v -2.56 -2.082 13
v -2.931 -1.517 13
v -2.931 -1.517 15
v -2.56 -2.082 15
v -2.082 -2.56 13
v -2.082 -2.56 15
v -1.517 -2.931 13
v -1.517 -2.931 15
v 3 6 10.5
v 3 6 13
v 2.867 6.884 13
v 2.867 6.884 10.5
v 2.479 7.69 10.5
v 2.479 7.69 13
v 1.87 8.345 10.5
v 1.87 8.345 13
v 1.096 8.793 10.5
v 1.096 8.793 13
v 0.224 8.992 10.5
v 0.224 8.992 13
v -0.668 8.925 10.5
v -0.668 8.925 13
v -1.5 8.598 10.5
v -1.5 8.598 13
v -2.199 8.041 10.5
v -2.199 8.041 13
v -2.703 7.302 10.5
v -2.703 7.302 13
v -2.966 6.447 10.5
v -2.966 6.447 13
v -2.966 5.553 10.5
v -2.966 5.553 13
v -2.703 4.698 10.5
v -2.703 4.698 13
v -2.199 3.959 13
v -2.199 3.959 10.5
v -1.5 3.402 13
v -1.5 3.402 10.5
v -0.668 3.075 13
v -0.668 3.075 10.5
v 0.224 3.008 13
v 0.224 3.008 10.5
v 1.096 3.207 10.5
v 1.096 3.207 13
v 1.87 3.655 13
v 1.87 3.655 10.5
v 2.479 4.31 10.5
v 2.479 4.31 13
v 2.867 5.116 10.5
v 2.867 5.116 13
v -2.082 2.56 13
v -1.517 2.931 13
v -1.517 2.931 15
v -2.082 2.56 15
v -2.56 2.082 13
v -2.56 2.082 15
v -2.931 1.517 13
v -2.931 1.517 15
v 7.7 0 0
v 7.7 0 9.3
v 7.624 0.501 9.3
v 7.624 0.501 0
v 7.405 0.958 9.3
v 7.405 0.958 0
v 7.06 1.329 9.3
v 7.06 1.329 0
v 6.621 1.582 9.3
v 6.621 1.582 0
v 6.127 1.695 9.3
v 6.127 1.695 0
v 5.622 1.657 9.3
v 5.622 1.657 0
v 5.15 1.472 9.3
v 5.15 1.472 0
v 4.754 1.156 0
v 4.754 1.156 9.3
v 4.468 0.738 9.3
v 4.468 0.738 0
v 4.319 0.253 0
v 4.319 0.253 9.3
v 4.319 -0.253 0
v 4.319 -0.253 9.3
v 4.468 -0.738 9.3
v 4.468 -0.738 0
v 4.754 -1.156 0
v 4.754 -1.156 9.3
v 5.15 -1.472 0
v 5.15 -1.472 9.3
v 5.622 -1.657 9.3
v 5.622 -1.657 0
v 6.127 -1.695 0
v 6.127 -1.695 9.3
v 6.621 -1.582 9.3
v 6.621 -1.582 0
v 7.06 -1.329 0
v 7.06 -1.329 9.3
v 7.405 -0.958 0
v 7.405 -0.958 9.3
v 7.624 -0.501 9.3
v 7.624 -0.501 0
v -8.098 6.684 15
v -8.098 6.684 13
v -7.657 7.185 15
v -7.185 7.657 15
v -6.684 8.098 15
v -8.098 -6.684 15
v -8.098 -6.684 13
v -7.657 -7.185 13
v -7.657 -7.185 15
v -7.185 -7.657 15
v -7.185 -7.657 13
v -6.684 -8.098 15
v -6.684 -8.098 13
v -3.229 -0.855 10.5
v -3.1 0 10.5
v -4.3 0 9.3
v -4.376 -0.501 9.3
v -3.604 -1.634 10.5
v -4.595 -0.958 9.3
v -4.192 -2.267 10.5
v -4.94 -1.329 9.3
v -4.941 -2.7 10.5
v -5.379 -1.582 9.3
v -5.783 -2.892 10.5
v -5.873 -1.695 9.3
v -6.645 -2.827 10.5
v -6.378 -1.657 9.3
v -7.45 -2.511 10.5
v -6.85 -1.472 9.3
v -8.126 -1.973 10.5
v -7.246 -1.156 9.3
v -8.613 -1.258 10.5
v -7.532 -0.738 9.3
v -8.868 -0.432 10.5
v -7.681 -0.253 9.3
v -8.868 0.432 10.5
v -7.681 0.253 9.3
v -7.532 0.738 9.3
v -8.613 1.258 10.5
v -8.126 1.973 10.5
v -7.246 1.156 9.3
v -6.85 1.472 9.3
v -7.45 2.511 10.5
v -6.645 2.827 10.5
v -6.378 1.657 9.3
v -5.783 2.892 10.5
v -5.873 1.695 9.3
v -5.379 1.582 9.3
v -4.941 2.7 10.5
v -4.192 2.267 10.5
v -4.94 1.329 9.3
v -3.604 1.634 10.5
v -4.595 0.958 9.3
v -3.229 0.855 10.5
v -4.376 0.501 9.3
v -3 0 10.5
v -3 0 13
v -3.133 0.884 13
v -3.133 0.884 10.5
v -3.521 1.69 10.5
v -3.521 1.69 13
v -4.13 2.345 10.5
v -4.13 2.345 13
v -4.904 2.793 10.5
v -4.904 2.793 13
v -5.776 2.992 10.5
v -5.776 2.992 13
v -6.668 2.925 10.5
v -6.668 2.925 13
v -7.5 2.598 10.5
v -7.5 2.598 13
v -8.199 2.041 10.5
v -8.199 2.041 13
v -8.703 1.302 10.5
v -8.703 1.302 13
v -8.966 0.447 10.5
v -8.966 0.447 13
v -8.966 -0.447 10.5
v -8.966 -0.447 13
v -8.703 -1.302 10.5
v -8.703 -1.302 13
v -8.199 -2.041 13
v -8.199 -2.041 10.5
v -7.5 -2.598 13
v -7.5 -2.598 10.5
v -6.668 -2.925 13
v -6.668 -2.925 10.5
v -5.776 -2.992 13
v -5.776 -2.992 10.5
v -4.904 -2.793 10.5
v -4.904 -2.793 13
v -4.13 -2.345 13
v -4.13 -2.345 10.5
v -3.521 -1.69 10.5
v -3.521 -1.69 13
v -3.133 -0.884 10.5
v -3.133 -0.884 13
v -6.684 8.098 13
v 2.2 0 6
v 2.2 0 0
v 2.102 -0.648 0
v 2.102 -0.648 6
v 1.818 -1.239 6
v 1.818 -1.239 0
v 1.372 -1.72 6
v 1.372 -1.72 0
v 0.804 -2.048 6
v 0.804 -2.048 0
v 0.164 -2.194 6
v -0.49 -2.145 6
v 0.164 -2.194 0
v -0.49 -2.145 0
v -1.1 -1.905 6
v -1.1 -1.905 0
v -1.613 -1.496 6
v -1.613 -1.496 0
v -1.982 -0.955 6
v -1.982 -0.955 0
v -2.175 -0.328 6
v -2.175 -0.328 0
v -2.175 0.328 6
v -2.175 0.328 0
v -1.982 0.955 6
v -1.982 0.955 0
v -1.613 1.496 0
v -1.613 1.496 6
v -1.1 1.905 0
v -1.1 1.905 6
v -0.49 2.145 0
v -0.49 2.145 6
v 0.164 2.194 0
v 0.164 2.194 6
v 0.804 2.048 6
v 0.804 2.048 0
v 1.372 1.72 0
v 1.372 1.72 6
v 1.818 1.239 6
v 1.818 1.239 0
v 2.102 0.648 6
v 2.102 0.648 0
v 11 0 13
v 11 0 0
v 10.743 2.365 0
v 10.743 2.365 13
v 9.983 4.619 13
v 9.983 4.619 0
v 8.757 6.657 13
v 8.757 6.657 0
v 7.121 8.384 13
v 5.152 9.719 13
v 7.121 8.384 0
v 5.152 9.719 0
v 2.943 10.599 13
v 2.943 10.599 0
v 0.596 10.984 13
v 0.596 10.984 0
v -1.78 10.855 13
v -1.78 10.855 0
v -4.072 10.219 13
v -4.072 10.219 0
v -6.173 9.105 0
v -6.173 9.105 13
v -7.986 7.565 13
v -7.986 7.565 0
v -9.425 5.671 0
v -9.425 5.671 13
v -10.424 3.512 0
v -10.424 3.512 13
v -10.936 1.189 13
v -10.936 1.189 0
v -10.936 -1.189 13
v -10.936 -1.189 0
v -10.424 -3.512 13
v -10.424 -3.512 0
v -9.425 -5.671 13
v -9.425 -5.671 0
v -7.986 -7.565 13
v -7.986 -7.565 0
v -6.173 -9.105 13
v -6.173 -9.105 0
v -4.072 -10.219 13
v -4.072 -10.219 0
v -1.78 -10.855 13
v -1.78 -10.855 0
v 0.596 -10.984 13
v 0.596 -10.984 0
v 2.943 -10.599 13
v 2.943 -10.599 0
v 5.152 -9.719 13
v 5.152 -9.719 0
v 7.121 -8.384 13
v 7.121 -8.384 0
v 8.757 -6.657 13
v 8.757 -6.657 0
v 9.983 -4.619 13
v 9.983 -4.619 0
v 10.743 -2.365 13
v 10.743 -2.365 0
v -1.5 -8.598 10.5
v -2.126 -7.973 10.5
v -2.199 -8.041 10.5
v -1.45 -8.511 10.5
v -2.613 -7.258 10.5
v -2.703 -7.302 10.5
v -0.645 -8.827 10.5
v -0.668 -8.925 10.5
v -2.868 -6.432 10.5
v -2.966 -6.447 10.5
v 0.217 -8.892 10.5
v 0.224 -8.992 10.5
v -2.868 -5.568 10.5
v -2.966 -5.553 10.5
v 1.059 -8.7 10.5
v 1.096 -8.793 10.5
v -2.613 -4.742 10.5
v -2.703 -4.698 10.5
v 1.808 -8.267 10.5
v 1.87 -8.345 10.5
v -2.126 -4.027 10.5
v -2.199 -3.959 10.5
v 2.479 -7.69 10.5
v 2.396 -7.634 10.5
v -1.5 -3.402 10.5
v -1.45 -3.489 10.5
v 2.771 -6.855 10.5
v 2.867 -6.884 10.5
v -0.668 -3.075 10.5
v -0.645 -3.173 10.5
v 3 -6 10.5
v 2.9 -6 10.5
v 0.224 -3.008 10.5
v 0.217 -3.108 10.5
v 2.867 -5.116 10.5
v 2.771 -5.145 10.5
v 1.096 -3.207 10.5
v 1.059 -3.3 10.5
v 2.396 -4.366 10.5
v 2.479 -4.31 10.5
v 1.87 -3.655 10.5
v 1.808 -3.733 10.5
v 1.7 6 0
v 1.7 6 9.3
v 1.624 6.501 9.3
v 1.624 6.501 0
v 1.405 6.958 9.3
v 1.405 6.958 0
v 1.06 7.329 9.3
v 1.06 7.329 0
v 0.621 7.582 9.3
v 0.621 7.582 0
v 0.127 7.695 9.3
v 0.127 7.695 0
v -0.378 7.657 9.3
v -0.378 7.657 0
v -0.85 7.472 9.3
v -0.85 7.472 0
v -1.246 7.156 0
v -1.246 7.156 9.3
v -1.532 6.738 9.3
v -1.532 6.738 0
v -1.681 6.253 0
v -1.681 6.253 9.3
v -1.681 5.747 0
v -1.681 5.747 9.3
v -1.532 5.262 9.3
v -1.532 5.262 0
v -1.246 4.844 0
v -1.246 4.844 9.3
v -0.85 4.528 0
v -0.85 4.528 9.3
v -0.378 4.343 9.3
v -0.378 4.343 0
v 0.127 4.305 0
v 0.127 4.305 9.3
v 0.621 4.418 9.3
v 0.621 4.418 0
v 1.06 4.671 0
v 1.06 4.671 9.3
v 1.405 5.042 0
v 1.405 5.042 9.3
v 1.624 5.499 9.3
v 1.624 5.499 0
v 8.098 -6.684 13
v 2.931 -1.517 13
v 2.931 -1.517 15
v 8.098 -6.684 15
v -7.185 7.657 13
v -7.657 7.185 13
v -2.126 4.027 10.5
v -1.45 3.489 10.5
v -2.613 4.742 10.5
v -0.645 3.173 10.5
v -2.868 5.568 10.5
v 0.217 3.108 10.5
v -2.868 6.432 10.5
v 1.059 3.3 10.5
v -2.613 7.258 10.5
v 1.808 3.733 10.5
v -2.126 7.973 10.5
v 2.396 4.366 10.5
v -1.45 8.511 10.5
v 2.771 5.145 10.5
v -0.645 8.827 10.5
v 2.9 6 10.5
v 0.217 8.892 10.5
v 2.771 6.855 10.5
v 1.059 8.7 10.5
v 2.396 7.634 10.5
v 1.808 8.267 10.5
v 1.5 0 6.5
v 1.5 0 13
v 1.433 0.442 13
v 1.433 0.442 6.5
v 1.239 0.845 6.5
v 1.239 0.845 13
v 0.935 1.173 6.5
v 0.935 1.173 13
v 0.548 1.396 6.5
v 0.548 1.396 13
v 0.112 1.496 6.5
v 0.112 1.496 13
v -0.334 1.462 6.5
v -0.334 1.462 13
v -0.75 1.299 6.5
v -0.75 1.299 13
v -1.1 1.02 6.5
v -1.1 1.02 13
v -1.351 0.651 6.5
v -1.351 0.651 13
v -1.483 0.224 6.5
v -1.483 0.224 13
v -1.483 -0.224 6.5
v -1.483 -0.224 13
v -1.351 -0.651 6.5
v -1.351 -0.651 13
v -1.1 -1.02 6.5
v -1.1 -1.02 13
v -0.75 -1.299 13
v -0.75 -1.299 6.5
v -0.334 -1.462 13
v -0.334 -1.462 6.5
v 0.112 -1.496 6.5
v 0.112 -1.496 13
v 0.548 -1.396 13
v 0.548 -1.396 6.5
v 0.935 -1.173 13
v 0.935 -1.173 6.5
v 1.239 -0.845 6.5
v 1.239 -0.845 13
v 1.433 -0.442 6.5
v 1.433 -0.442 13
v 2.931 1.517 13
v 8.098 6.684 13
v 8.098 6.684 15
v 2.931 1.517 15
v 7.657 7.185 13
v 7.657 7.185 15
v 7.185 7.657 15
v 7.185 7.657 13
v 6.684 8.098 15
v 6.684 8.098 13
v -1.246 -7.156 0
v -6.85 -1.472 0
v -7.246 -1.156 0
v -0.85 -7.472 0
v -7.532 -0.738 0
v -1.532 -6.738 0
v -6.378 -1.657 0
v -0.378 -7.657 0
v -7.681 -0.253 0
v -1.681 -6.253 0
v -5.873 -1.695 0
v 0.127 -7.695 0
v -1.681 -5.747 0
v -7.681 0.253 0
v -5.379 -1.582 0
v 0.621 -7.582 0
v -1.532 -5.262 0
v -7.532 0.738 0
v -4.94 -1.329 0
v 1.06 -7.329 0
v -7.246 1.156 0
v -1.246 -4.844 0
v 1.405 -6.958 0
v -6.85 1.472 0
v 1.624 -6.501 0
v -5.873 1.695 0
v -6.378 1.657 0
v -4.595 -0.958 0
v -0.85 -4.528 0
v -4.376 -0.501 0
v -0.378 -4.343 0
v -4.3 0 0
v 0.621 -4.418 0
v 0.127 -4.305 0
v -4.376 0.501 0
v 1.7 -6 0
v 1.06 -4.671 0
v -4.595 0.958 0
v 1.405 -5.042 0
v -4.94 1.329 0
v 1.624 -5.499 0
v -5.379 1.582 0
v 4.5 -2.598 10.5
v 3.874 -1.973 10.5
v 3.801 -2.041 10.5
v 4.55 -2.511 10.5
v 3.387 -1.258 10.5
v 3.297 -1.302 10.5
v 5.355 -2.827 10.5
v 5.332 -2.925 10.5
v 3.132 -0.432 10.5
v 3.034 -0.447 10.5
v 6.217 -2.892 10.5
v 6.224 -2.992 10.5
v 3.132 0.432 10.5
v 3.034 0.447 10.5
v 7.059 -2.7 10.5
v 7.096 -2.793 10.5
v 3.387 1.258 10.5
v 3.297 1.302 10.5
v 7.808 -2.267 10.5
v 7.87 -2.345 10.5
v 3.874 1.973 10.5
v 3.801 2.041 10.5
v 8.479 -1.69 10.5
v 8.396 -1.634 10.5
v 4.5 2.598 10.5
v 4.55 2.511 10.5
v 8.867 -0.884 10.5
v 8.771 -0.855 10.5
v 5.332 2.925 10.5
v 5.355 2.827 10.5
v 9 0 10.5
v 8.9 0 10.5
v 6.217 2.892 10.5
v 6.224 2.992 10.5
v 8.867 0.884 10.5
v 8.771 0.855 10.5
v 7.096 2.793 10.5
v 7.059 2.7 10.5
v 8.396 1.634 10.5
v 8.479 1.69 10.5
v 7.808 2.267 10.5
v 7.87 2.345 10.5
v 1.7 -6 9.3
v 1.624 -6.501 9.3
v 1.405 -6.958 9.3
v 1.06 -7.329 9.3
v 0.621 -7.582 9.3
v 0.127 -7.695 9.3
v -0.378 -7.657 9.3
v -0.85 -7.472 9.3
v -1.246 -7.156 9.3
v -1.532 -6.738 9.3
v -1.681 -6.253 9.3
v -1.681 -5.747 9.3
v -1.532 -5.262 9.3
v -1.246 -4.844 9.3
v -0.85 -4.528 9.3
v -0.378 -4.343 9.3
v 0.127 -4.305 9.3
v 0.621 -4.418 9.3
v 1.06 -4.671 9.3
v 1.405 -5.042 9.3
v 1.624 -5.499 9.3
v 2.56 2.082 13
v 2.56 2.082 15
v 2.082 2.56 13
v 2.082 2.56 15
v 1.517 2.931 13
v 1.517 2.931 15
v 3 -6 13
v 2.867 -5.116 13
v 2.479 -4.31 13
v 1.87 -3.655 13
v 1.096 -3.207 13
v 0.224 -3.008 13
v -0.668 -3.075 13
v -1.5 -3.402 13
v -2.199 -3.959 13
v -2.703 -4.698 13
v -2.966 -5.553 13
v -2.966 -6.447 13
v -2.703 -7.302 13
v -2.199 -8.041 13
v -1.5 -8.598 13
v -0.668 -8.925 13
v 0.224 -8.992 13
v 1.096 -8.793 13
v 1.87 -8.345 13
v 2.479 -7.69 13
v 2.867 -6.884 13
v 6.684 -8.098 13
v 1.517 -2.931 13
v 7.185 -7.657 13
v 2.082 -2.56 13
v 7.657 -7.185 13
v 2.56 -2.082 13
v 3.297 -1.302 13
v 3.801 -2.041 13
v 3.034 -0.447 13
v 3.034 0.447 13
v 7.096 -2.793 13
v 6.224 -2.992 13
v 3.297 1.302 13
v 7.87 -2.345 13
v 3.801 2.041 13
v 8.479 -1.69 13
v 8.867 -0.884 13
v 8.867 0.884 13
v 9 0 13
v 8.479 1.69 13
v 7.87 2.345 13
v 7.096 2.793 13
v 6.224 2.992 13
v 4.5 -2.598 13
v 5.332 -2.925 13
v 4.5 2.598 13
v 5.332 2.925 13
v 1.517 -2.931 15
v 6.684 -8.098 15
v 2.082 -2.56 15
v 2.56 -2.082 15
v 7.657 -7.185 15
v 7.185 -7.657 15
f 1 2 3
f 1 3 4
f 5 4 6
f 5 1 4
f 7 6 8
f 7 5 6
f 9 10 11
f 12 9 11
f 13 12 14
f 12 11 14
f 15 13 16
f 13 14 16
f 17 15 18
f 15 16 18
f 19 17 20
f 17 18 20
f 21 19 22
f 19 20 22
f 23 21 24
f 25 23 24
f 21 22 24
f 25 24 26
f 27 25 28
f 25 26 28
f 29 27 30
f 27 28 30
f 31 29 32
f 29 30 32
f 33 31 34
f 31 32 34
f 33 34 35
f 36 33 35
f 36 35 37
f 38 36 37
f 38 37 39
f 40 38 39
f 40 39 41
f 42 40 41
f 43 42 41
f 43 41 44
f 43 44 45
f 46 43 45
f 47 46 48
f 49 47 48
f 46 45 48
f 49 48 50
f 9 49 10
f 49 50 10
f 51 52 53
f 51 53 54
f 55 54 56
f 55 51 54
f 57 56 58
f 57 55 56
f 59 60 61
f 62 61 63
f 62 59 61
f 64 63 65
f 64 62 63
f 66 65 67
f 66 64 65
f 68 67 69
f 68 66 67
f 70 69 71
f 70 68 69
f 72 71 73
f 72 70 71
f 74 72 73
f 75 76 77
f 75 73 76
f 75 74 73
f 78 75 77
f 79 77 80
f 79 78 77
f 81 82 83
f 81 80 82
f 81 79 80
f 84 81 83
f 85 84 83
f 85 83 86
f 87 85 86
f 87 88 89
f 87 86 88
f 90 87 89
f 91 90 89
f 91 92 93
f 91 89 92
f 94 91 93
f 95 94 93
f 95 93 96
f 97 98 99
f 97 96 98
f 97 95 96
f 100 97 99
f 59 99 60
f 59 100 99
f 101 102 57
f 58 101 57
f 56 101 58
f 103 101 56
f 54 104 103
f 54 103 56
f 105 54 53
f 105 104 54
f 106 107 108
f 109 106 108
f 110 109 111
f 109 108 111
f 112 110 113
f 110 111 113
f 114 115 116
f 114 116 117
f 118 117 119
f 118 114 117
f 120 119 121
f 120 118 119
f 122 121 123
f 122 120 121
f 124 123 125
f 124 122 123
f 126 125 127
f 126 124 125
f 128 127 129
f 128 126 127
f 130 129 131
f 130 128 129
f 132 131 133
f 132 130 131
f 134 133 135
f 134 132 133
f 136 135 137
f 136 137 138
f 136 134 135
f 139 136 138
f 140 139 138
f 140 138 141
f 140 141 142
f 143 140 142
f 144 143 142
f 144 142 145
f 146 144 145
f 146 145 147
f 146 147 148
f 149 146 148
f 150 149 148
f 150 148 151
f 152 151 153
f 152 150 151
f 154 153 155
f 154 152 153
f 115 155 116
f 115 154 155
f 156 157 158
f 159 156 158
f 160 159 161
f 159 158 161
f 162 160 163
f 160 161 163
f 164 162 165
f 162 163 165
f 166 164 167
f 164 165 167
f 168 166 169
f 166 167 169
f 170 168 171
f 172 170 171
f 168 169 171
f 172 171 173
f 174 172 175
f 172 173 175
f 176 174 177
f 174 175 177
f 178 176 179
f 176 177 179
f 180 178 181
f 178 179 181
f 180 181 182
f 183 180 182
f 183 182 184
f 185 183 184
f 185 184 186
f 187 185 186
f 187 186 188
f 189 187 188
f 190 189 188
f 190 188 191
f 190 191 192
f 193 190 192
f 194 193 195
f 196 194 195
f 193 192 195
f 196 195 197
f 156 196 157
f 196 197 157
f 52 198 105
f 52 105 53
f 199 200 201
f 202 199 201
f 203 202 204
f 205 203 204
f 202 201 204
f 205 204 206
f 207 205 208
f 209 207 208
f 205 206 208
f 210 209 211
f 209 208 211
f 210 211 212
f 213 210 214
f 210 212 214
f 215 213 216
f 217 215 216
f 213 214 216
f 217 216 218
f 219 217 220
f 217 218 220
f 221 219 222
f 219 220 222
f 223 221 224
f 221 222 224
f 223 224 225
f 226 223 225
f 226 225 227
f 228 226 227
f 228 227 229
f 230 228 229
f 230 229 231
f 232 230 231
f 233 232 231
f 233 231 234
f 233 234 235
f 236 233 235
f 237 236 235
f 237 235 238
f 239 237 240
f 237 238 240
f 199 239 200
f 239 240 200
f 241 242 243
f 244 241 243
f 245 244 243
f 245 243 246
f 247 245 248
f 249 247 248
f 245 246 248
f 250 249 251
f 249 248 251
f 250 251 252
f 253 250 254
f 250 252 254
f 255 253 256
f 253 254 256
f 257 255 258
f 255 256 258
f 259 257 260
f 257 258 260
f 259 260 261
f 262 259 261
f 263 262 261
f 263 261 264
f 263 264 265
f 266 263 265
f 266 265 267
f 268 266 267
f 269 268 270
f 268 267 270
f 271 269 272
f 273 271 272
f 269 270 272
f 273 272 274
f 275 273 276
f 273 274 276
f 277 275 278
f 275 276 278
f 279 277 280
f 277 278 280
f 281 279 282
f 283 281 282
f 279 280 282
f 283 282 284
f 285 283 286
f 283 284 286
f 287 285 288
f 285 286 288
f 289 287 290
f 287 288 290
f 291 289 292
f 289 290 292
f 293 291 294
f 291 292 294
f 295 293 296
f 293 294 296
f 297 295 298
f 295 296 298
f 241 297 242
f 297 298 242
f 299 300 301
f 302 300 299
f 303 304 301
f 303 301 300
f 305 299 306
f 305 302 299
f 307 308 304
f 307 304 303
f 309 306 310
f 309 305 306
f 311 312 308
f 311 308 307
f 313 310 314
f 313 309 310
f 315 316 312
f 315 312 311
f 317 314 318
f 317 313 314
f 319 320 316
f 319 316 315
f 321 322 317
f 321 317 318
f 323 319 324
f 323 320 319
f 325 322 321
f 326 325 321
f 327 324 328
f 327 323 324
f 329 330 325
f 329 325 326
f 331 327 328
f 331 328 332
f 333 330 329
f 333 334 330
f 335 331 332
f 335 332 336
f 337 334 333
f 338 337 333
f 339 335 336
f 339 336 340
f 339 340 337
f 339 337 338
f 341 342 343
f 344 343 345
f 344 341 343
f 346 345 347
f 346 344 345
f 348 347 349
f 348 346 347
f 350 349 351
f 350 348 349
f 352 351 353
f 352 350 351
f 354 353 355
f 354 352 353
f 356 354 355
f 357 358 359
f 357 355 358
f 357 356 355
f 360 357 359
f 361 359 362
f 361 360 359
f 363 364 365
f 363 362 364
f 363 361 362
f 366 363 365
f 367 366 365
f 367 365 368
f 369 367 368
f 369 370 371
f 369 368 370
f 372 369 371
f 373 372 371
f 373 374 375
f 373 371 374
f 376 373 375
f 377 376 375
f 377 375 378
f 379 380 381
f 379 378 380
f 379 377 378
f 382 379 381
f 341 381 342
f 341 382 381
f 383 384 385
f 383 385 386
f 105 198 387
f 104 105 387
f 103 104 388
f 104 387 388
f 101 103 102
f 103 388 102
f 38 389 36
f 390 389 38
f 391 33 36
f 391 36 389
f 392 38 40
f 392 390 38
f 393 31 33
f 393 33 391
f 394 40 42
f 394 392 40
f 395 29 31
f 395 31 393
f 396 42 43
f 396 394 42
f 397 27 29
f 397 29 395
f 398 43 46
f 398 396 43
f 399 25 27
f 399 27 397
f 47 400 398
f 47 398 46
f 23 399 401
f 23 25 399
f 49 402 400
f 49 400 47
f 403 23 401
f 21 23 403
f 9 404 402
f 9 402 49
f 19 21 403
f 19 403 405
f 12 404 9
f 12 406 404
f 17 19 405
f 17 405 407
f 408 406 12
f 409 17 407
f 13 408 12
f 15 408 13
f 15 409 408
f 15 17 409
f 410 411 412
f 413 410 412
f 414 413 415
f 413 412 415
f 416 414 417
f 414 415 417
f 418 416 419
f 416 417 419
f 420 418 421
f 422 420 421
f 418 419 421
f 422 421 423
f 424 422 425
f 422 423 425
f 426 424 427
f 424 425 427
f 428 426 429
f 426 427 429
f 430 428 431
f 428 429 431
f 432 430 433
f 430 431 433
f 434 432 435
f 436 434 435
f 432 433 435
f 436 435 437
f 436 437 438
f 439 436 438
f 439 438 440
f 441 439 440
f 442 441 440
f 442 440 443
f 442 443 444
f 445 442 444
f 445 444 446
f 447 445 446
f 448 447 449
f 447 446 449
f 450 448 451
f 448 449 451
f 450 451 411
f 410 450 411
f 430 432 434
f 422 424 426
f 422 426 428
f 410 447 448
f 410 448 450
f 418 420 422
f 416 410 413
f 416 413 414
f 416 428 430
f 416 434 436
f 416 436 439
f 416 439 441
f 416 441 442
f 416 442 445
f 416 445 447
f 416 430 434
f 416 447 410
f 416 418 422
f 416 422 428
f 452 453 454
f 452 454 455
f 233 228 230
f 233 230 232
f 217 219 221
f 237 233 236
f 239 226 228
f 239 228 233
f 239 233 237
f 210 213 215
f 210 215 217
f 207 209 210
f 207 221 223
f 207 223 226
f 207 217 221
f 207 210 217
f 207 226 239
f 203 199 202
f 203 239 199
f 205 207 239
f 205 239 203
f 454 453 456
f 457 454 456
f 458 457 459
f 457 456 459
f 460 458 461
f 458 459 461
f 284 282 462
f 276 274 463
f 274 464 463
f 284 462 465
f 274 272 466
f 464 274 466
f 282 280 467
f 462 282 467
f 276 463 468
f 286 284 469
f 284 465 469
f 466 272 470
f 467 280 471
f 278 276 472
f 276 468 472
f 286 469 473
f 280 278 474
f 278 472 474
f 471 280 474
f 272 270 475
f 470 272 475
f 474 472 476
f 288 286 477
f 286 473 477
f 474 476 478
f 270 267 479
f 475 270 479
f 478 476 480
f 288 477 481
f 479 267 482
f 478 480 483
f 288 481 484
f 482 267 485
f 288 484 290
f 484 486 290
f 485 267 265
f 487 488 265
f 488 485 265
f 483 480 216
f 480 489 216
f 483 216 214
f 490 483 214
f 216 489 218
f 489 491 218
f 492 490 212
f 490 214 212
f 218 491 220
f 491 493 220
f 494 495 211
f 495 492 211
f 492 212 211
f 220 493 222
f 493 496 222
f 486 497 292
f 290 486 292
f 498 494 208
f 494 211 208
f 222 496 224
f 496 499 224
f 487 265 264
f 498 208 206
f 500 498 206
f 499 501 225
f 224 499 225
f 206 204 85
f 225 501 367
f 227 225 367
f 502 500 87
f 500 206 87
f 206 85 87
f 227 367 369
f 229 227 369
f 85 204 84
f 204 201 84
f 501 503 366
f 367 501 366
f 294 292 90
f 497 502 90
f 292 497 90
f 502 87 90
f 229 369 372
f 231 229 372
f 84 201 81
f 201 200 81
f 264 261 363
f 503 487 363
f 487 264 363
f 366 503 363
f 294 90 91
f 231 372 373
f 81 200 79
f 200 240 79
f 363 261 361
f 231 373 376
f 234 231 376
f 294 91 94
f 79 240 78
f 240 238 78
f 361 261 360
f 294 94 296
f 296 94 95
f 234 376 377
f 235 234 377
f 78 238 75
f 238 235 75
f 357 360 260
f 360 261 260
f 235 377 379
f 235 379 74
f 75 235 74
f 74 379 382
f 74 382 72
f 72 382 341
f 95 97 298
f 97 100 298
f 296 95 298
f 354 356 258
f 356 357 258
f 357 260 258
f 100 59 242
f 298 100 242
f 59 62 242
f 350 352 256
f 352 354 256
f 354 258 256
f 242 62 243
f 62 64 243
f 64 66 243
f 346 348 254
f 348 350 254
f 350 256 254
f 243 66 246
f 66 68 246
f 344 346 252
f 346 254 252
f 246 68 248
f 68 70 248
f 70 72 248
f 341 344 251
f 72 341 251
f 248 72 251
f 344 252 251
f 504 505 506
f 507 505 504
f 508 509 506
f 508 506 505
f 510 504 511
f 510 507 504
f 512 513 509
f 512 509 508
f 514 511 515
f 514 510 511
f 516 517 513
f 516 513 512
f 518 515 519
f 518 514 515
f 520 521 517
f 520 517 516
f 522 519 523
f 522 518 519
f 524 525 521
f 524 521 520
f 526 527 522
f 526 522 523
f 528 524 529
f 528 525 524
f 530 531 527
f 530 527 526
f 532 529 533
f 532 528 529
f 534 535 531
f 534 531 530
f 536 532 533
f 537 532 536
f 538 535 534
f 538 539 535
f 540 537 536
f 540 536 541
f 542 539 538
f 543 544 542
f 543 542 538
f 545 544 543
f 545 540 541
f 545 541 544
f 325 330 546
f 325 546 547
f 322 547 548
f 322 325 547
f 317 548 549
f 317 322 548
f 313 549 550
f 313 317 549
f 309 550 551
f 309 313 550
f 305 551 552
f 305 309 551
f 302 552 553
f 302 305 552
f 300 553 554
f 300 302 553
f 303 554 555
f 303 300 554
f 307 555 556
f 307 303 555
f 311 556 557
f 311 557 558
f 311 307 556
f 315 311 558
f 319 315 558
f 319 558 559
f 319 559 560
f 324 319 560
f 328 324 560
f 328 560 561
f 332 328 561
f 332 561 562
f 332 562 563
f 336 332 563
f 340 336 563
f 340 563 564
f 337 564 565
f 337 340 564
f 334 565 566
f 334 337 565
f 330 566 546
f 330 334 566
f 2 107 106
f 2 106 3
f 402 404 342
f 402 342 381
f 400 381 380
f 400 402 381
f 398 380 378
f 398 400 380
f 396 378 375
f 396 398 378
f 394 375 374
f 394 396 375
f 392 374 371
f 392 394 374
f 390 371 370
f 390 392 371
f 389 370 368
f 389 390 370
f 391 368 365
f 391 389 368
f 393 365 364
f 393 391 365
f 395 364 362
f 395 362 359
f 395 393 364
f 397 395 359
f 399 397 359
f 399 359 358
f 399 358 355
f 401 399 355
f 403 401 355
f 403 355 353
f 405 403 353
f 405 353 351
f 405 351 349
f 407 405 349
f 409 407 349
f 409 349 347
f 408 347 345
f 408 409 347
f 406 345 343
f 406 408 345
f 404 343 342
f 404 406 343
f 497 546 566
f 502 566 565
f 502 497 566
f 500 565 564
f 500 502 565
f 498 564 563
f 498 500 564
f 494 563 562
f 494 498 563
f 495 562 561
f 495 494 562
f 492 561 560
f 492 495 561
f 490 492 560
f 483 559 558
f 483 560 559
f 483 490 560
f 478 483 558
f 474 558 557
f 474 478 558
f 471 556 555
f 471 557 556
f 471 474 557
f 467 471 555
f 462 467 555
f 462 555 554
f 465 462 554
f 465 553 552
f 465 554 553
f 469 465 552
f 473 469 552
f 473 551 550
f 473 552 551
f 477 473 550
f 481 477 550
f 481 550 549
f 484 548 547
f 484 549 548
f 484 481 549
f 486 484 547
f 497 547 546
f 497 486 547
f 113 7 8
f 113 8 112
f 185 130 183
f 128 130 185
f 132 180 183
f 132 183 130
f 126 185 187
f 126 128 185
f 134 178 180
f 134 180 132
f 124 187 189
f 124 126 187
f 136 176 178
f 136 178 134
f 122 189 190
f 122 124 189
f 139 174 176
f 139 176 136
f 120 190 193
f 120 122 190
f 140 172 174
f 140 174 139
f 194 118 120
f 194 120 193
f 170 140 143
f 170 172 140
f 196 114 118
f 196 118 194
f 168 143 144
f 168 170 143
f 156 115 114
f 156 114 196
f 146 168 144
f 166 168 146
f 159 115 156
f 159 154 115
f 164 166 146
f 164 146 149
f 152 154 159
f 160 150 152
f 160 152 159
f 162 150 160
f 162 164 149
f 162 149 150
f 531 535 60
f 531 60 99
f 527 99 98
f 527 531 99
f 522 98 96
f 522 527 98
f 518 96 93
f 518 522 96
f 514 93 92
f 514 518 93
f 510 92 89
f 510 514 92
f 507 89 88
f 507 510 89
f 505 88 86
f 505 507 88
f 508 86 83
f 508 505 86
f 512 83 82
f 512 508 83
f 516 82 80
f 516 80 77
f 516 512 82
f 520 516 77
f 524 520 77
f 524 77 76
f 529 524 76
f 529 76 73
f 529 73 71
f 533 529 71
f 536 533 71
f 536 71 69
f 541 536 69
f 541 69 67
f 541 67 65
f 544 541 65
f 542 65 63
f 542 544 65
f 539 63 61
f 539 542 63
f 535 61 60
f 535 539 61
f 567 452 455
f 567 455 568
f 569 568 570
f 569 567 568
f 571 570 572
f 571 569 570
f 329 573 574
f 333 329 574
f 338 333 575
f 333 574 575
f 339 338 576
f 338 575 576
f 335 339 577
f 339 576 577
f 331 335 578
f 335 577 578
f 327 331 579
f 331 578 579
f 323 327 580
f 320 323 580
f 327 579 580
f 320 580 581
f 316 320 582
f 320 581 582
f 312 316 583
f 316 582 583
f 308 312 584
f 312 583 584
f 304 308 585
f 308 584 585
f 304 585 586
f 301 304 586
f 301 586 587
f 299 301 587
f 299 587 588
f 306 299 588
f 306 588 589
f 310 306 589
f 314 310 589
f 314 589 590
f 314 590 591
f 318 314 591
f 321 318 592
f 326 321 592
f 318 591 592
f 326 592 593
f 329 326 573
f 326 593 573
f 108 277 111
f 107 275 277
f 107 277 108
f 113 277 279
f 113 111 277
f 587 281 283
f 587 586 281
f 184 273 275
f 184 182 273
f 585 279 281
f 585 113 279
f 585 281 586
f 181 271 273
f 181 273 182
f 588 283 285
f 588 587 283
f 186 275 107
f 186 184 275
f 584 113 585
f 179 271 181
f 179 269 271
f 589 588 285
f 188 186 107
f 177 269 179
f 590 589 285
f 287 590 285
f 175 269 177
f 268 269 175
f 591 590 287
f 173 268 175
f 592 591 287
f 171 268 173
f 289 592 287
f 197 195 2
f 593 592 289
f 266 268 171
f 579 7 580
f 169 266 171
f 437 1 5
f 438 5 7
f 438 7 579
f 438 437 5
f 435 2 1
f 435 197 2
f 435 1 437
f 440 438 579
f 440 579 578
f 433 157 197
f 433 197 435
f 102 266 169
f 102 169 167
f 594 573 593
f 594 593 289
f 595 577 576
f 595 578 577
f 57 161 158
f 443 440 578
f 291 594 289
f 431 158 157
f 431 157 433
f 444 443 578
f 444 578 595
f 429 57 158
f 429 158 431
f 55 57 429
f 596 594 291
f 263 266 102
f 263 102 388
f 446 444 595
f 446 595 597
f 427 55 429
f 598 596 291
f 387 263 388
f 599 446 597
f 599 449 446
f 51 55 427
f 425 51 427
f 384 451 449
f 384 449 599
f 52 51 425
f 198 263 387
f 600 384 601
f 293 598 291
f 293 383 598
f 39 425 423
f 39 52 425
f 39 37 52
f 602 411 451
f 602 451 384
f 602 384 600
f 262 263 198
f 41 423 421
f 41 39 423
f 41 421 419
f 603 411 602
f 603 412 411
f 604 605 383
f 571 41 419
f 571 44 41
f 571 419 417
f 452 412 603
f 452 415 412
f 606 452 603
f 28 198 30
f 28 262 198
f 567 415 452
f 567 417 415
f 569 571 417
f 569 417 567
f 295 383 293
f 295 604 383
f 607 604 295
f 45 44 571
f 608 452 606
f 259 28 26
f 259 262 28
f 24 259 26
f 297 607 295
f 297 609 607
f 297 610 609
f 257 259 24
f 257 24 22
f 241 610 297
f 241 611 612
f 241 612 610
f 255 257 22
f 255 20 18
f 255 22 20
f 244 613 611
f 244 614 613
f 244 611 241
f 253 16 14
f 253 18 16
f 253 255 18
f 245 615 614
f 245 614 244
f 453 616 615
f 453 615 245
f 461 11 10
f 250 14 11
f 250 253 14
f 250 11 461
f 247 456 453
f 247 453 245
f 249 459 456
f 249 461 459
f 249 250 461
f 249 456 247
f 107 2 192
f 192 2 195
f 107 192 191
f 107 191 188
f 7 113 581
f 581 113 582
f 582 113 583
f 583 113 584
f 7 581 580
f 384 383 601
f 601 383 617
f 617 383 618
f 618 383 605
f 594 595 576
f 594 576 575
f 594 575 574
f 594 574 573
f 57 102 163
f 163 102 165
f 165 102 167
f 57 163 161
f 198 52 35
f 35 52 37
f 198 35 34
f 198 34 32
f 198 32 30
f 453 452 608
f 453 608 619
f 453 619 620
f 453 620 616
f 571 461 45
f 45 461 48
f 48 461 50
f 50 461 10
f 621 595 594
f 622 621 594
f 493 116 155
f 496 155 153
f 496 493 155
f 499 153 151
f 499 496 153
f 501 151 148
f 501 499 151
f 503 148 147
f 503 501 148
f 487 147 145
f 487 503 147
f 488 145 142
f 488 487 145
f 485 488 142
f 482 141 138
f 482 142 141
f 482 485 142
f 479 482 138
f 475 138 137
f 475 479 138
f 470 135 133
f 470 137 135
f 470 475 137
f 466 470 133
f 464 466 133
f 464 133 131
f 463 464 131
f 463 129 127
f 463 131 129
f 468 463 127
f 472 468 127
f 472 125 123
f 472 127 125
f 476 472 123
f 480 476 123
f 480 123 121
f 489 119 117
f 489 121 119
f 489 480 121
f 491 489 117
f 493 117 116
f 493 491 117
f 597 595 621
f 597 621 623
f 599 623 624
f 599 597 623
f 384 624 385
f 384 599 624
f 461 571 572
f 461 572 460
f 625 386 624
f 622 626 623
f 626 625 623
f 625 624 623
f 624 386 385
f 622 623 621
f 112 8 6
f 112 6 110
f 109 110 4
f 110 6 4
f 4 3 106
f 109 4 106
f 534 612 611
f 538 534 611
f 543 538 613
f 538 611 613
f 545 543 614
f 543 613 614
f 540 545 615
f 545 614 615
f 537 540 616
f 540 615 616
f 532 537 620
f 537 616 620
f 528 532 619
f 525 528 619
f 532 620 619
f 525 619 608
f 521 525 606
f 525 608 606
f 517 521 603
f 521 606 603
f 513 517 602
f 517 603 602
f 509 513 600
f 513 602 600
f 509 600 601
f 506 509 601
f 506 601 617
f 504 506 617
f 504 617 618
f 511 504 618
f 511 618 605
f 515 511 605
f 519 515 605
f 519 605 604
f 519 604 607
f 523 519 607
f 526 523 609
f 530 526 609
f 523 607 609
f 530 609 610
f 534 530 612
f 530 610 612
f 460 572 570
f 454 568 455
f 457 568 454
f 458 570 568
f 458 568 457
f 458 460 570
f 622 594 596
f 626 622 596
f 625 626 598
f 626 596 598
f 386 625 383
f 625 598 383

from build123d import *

# Parameters (mm, degrees)
SKETCH_R        = 11
SKETCH_R_2      = 1.7
PAD_DEPTH       = 13
SKETCH003_R     = 1.5
POCKET001_DEPTH = 6.5
PAD001_DEPTH    = 2
SKETCH006_R     = 3
POCKET003_DEPTH = 2.5
CHAMFER_SIZE    = 1.2
CHAMFER001_SIZE = 1.2
CHAMFER002_SIZE = 1.2
CHAMFER003_SIZE = 1.2
SKETCH007_R     = 2.2
POCKET_DEPTH    = 6


with BuildPart() as part:
    # Sketch → Pad (new body)
    with BuildSketch(Plane.XY):
        Circle(SKETCH_R)
        with Locations((0, 6)):
            Circle(SKETCH_R_2, mode=Mode.SUBTRACT)
        with Locations((-6, 0)):
            Circle(SKETCH_R_2, mode=Mode.SUBTRACT)
        with Locations((6, 0)):
            Circle(SKETCH_R_2, mode=Mode.SUBTRACT)
        with Locations((0, -6)):
            Circle(SKETCH_R_2, mode=Mode.SUBTRACT)
    extrude(amount=PAD_DEPTH)

    # Sketch003 → Pocket001 (cut)
    with BuildSketch(Plane.XY.offset(13)):
        Circle(SKETCH003_R)
    extrude(amount=-POCKET001_DEPTH, mode=Mode.SUBTRACT)

    # Sketch004 → Pad001 (new body)
    with BuildSketch(Plane.XY.offset(13)):
        with BuildLine():
            Line((-8.09798, 6.683766), (-2.930842, 1.516629))
            ThreePointArc((-1.516629, 2.930842), (-2.333452, 2.333452), (-2.930842, 1.516629))
            Line((-6.683766, 8.09798), (-1.516629, 2.930842))
            ThreePointArc((-6.683766, 8.09798), (-7.424621, 7.424621), (-8.09798, 6.683766))
        make_face()
        with BuildLine():
            Line((2.930842, -1.516629), (8.09798, -6.683766))
            ThreePointArc((6.683766, -8.09798), (7.424621, -7.424621), (8.09798, -6.683766))
            Line((1.516629, -2.930842), (6.683766, -8.09798))
            ThreePointArc((1.516629, -2.930842), (2.333452, -2.333452), (2.930842, -1.516629))
        make_face()
        with BuildLine():
            ThreePointArc((8.09798, 6.683766), (7.424621, 7.424621), (6.683766, 8.09798))
            Line((1.516629, 2.930842), (6.683766, 8.09798))
            ThreePointArc((2.930842, 1.516629), (2.333452, 2.333452), (1.516629, 2.930842))
            Line((8.09798, 6.683766), (2.930842, 1.516629))
        make_face()
        with BuildLine():
            ThreePointArc((-2.930842, -1.516629), (-2.333452, -2.333452), (-1.516629, -2.930842))
            Line((-1.516629, -2.930842), (-6.683766, -8.09798))
            ThreePointArc((-8.09798, -6.683766), (-7.424621, -7.424621), (-6.683766, -8.09798))
            Line((-8.09798, -6.683766), (-2.930842, -1.516629))
        make_face()
    extrude(amount=PAD001_DEPTH)

    # Sketch006 → Pocket003 (cut)
    with BuildSketch(Plane.XY.offset(13)):
        with Locations((0, 6)):
            Circle(SKETCH006_R)
        with Locations((-6, 0)):
            Circle(SKETCH006_R)
        with Locations((6, 0)):
            Circle(SKETCH006_R)
        with Locations((0, -6)):
            Circle(SKETCH006_R)
    extrude(amount=-POCKET003_DEPTH, mode=Mode.SUBTRACT)

    # Chamfer
    chamfer_edges = [part.edges().sort_by_distance(p)[0] for p in [
        (-1.7, 6, 10.5),
    ]]
    chamfer(chamfer_edges, length=CHAMFER_SIZE)

    # Chamfer001
    chamfer001_edges = [part.edges().sort_by_distance(p)[0] for p in [
        (-7.7, 0, 10.5),
    ]]
    chamfer(chamfer001_edges, length=CHAMFER001_SIZE)

    # Chamfer002
    chamfer002_edges = [part.edges().sort_by_distance(p)[0] for p in [
        (-1.7, -6, 10.5),
    ]]
    chamfer(chamfer002_edges, length=CHAMFER002_SIZE)

    # Chamfer003
    chamfer003_edges = [part.edges().sort_by_distance(p)[0] for p in [
        (4.3, 0, 10.5),
    ]]
    chamfer(chamfer003_edges, length=CHAMFER003_SIZE)

    # Sketch007 → Pocket (cut)
    with BuildSketch(Plane(origin=(0, 0, 0), x_dir=(1, 0, 0), z_dir=(0, 0, -1))):
        Circle(SKETCH007_R)
    extrude(amount=-POCKET_DEPTH, mode=Mode.SUBTRACT)


solid = part.part
